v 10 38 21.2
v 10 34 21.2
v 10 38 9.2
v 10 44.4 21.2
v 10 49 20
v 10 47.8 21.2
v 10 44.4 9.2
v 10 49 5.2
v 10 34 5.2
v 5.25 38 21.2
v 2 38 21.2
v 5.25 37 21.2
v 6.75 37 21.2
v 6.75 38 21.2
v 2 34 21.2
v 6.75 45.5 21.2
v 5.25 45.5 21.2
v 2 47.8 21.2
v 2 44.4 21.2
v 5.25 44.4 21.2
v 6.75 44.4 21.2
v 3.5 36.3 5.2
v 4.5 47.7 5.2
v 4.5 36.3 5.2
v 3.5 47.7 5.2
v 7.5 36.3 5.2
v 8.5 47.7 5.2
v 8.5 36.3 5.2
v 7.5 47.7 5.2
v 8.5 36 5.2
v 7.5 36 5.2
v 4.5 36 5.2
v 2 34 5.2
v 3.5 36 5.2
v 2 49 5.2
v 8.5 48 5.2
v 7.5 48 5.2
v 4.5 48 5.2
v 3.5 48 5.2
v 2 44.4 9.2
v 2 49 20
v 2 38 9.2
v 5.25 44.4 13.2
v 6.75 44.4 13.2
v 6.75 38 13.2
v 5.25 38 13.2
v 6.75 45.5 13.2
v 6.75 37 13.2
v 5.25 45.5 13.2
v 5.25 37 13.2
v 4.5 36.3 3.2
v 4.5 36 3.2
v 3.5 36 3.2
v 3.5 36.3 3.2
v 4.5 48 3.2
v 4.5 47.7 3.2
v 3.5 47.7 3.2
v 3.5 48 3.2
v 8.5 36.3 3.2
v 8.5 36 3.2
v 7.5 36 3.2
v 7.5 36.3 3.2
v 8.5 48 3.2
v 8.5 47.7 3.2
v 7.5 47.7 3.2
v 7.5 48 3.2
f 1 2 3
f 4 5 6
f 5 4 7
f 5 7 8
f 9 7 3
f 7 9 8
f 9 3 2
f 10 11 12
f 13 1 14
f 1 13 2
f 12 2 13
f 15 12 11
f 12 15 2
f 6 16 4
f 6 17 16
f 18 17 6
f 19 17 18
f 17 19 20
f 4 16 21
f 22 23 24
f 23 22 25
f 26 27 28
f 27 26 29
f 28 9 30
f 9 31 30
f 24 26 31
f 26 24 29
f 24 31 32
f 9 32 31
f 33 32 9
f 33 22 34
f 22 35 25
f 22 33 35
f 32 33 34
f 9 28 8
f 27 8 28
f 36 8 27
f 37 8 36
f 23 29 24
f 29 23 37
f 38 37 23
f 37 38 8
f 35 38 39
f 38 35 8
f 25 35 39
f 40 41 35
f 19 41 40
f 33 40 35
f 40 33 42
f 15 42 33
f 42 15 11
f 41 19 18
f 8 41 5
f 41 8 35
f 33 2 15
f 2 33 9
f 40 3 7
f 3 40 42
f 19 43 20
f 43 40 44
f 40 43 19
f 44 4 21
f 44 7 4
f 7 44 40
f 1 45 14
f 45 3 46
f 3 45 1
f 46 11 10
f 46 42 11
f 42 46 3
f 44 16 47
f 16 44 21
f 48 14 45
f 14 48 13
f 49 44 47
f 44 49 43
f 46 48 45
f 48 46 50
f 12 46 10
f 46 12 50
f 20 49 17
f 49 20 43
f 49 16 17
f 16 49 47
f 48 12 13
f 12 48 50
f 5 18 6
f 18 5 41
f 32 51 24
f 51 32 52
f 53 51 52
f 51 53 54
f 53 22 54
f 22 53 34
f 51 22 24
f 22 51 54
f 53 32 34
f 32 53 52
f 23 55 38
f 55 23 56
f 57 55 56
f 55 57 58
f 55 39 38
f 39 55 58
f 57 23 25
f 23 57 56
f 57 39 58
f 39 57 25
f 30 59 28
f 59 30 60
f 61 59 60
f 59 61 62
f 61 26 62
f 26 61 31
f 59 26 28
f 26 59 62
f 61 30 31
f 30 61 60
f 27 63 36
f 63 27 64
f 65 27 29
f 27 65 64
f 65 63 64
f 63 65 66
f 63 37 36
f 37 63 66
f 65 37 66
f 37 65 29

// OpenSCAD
d=4;
module tcst1103(len=2,x=1,r=0){
  translate([(x+len/2)*d-2,10.5*d,5.2])
  rotate([0,0,-90*r])
    translate([-len*d/2,-1.5*d,0]){
    color("#222222")
    difference(){
      //cube([len*d,2.5*d,d]);
      translate([0,-2,0])
      cube([2*d,2.5*d+5,4*d]);
      translate([-.1,2,d])
      cube([8.2,1.6*d,12.1]);
      translate([3.25,1,2*d])
      cube([1.5,8.5,8.1]);
      translate([-.1,13.8,3.5*d])
      rotate([45,0,0])
      cube([8.2,d,d]);
    }
    color("Silver")
    for(i=[1:len]){
      translate([i*d-2.5,0,-2]){
        cube([1,.3,d]);
      }
      translate([i*d-2.5,3*d,-2]){
        rotate([0,0,180])
        translate([-1,0,0])
        cube([1,.3,d]);
      }
    }//end pins
  }
}

tcst1103();
//tcst1103(r=2);
